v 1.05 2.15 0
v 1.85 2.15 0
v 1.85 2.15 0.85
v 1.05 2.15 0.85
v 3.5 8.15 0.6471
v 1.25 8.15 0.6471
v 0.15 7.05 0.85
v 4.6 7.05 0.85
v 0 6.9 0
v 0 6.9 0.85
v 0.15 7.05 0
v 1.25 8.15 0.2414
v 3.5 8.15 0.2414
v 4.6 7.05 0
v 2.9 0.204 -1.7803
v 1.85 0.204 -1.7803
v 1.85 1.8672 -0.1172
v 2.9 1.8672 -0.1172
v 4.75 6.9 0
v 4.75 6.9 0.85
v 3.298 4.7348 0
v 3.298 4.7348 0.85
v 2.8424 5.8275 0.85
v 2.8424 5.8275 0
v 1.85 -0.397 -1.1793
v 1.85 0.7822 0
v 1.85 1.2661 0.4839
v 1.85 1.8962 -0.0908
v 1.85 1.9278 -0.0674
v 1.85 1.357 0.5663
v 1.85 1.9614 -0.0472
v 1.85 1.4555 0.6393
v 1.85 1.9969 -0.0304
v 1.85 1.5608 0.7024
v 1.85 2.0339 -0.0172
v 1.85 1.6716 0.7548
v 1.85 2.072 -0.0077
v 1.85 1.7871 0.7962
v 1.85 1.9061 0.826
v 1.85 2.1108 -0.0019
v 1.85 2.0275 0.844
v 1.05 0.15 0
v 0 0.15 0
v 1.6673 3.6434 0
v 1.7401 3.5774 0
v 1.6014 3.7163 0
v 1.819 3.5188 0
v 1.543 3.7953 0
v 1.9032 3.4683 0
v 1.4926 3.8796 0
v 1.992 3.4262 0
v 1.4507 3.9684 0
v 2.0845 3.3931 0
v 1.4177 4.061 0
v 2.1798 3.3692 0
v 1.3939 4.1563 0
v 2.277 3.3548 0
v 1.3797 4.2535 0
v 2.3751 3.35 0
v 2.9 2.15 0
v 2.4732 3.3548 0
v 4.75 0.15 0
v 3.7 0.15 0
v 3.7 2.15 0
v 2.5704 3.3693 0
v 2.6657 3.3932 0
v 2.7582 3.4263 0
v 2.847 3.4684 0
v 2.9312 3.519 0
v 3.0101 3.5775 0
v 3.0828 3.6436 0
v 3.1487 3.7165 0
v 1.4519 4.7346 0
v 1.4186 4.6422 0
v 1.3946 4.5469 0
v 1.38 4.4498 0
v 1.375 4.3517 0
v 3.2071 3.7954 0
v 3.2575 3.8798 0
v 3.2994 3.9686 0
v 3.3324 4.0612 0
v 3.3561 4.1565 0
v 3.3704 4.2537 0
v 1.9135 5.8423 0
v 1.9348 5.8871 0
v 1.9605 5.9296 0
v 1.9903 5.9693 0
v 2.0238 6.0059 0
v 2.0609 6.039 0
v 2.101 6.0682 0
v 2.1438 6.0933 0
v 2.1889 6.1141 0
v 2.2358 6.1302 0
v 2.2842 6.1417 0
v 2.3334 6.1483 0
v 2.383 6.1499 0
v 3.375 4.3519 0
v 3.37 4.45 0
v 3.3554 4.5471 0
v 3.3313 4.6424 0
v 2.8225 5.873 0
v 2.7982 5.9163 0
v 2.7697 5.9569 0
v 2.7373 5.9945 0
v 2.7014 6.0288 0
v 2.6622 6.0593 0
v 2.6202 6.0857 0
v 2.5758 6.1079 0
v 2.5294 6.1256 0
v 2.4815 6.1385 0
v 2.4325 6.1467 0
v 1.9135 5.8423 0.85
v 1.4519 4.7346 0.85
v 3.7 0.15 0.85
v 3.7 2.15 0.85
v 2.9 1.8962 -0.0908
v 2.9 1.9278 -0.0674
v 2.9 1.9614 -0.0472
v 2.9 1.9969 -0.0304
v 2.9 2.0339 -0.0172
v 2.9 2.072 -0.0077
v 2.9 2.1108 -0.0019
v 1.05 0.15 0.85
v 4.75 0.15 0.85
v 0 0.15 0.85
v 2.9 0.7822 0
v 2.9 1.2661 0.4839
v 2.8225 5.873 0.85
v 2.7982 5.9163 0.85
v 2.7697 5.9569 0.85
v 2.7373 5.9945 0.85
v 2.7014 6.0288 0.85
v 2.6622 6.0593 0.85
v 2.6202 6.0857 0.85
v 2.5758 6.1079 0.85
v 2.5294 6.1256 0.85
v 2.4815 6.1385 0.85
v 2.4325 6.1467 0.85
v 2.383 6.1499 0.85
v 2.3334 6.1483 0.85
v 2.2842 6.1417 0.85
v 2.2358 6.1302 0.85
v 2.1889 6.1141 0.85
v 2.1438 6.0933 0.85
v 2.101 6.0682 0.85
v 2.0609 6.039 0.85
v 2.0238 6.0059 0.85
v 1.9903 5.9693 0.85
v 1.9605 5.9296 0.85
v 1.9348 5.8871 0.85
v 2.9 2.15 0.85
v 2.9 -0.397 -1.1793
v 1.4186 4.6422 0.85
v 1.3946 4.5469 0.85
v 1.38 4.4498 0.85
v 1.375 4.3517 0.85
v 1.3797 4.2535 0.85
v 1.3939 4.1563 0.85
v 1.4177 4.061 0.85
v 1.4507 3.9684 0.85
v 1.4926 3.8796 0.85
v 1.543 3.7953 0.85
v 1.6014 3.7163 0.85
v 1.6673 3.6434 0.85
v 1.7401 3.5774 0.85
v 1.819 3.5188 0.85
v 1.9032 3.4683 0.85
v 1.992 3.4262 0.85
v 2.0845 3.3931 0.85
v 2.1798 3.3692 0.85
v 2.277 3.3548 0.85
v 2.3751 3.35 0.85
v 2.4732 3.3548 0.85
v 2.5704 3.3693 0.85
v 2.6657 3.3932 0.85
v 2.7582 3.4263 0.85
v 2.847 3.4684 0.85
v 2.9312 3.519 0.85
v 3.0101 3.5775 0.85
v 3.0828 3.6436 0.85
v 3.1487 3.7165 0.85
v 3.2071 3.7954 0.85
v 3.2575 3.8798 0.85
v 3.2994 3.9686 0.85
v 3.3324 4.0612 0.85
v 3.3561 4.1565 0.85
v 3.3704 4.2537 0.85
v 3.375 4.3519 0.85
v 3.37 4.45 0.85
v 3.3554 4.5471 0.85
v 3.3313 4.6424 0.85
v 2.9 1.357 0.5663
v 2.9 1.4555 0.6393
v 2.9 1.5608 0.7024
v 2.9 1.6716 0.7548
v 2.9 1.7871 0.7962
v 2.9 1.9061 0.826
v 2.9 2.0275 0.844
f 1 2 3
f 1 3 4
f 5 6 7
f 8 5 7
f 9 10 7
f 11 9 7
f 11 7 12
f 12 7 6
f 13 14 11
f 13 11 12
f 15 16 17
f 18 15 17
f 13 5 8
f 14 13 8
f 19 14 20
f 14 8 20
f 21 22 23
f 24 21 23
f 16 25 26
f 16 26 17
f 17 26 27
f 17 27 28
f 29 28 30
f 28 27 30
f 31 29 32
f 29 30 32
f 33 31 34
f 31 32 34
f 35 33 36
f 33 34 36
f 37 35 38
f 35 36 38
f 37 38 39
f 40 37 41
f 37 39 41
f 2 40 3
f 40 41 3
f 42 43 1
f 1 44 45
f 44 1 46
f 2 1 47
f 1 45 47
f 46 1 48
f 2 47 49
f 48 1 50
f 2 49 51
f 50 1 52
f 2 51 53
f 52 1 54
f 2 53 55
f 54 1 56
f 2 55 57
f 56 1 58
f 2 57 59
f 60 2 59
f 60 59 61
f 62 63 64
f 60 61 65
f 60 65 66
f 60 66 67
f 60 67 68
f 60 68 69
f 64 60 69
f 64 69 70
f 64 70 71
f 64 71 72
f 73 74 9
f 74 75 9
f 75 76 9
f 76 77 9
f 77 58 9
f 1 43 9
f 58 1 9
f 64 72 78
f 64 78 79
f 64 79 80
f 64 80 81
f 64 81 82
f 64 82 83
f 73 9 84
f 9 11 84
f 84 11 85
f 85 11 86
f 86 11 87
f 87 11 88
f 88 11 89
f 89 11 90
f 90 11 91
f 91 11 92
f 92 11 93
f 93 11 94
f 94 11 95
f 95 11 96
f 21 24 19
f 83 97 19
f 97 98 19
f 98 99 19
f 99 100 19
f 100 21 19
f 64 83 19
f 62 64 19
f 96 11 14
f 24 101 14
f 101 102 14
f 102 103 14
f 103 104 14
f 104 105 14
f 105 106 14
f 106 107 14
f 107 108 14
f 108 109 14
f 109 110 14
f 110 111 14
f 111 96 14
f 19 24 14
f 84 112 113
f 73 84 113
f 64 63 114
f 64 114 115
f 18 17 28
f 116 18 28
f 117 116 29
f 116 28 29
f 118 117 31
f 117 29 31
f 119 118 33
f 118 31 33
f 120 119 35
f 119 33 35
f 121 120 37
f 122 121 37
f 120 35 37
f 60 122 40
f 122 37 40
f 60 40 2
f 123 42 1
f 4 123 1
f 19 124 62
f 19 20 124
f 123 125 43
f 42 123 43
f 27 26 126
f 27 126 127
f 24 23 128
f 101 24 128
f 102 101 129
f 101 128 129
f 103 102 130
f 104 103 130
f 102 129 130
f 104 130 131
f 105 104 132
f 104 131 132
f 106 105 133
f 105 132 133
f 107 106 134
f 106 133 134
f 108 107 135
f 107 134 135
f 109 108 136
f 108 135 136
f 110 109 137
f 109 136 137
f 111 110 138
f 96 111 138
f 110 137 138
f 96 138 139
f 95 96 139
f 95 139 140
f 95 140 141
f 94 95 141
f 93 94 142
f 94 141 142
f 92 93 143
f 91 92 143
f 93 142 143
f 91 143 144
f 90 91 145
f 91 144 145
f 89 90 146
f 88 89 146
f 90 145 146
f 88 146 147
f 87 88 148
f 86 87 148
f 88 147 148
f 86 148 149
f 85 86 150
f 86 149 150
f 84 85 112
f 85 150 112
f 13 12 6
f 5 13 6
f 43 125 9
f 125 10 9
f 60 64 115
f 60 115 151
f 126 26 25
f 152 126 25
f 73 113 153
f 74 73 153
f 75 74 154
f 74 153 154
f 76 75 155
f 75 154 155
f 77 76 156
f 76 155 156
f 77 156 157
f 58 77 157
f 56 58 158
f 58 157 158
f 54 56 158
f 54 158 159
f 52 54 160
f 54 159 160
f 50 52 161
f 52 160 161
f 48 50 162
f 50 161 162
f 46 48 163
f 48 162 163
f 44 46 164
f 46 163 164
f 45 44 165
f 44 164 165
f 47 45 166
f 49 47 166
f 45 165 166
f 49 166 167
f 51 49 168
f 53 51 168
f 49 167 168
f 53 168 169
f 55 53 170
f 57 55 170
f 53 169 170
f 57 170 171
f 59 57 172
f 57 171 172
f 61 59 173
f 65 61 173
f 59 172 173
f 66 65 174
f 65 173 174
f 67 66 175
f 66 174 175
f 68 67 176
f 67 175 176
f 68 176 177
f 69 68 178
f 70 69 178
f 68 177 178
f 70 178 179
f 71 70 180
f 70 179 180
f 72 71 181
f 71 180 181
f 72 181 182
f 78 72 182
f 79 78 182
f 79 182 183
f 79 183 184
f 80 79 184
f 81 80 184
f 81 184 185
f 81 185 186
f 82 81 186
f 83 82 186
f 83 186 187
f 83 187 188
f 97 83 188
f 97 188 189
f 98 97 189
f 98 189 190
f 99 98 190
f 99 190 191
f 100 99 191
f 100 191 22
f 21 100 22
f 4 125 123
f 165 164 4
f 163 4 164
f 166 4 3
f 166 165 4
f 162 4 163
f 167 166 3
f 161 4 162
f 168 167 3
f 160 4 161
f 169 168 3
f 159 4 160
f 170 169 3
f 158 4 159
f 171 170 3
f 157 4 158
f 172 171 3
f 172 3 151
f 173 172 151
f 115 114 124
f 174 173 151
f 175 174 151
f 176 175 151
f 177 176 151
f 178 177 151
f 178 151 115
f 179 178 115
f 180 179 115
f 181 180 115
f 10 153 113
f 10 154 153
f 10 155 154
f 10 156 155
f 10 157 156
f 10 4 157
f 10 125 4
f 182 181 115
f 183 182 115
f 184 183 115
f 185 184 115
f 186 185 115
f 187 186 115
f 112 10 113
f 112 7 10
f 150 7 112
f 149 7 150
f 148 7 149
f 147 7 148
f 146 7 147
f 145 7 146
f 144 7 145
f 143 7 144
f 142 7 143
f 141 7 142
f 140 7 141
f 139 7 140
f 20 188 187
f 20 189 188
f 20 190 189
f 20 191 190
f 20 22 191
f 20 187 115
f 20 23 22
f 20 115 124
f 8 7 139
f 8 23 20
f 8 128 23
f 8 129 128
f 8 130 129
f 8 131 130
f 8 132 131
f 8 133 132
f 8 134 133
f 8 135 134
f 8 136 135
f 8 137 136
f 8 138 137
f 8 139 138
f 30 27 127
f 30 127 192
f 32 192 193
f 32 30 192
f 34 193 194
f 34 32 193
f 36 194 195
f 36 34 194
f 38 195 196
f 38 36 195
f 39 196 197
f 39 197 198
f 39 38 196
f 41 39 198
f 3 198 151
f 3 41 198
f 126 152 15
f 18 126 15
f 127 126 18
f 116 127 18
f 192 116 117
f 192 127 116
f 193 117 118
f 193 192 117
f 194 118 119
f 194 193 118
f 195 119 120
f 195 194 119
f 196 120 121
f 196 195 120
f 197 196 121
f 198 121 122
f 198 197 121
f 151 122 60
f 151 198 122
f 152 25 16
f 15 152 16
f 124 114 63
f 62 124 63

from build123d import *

# Parameters (mm, degrees)
BOSS_EXTRUDE1_DEPTH    = 4.75
CUT_EXTRUDE1_REACH     = 11.471
CUT_EXTRUDE2_DEPTH     = 0.85
SKETCH6_W              = 0.8
SKETCH6_H              = 2
CUT_EXTRUDE3_DEPTH     = 0.85
SKETCH7_W              = 1.05
SKETCH7_H              = 0.85
BOSS_EXTRUDE2_DEPTH    = 1
SKETCHED_START         = 1.85
SKETCHED_BEND1_DEPTH   = 1.05
SKETCHED_BEND1_2_DEPTH = 1.05


# Read off the part's stored shape, not the designer's step: Sketched Bend1
with BuildPart() as part:
    # Sketch1 → Boss-Extrude1 (new body)
    with BuildSketch(Plane(origin=(0, 0, 0), x_dir=(0, 0, -1), z_dir=(1, 0, 0))):
        Polygon((0, 0.15), (0, 7.05), (-0.241393443, 8.15), (-0.647131148, 8.15), (-0.85, 7.05), (-0.85, 0.15), align=None)
    extrude(amount=BOSS_EXTRUDE1_DEPTH)

    # Cut-Extrude1: up to this face of the body (flat: up to its plane)
    cut_extrude1_end = Plane(part.part.faces().sort_by_distance((2.375, 3.6, 0))[0])
    # Sketch4 → Cut-Extrude1 (cut, up to the picked face)
    with BuildSketch(Plane.XY.offset(0.85), mode=Mode.PRIVATE) as cut_extrude1_sk1:
        Polygon((0, 6.9), (1.25, 8.15), (0, 8.15), align=None)
    cut_extrude1_tool1 = split(extrude(cut_extrude1_sk1.sketch, amount=-CUT_EXTRUDE1_REACH, mode=Mode.PRIVATE), bisect_by=cut_extrude1_end, keep=Keep.BOTH, mode=Mode.PRIVATE)
    # Sketch4 → Cut-Extrude1 (cut, up to the picked face)
    with BuildSketch(Plane.XY.offset(0.85), mode=Mode.PRIVATE) as cut_extrude1_sk2:
        Polygon((3.5, 8.15), (4.75, 6.9), (4.75, 8.15), align=None)
    cut_extrude1_tool2 = split(extrude(cut_extrude1_sk2.sketch, amount=-CUT_EXTRUDE1_REACH, mode=Mode.PRIVATE), bisect_by=cut_extrude1_end, keep=Keep.BOTH, mode=Mode.PRIVATE)
    add(cut_extrude1_tool1.solids().sort_by(Axis((0.416667, 7.733333, 0.85), (0, 0, -1)))[0], mode=Mode.SUBTRACT)
    add(cut_extrude1_tool2.solids().sort_by(Axis((4.333333, 7.733333, 0.85), (0, 0, -1)))[0], mode=Mode.SUBTRACT)

    # Sketch5 → Cut-Extrude2 (cut)
    with BuildSketch(Plane.XY.offset(0.85)):
        with BuildLine():
            Line((1.913461538, 5.842307692), (1.451923077, 4.734615385))
            ThreePointArc((1.451923077, 4.734615385), (2.37510742, 3.350000006), (3.297994271, 4.734813689))
            Line((3.297994271, 4.734813689), (2.842436975, 5.827489929))
            ThreePointArc((2.842436975, 5.827489929), (2.382974312, 6.149936406), (1.913461538, 5.842307692))
        make_face()
    extrude(amount=-CUT_EXTRUDE2_DEPTH, mode=Mode.SUBTRACT)

    # Sketch6 → Cut-Extrude3 (cut)
    with BuildSketch(Plane(origin=(0, 0, 0), x_dir=(-1, 0, 0), z_dir=(0, 0, -1))):
        with Locations((-3.3, 1.15)):
            Rectangle(SKETCH6_W, SKETCH6_H)
        with Locations((-1.45, 1.15)):
            Rectangle(SKETCH6_W, SKETCH6_H)
    extrude(amount=-CUT_EXTRUDE3_DEPTH, mode=Mode.SUBTRACT)

    # Sketch7 → Boss-Extrude2 (add)
    with BuildSketch(Plane.XZ.offset(-0.15)):
        with Locations((2.375, 0.425)):
            Rectangle(SKETCH7_W, SKETCH7_H)
    extrude(amount=BOSS_EXTRUDE2_DEPTH)

    # Sketched Bend1 outline → Sketched Bend1 (cut)
    with BuildSketch(Plane.YZ.offset(SKETCHED_START)):
        with BuildLine():
            ThreePointArc((1.266116524, 0.483883476), (1.67164571, 0.754849416), (2.15, 0.85))
            Line((2.15, 0.85), (-0.85, 0.85))
            Line((-0.85, 0.85), (-0.85, 0))
            Line((-0.85, 0), (0.782233048, 0))
            Line((0.782233048, 0), (1.266116524, 0.483883476))
        make_face()
    extrude(amount=SKETCHED_BEND1_DEPTH, mode=Mode.SUBTRACT)

    # Sketched Bend1 2 outline → Sketched Bend1 2 (add)
    with BuildSketch(Plane.YZ.offset(SKETCHED_START)):
        with BuildLine():
            Line((2.15, 0), (0.782233048, 0))
            Line((0.782233048, 0), (-0.397031517, -1.179264564))
            Line((-0.397031517, -1.179264564), (0.204009247, -1.780305328))
            Line((0.204009247, -1.780305328), (1.867157288, -0.117157288))
            ThreePointArc((1.867157288, -0.117157288), (1.996926627, -0.030448187), (2.15, 0))
        make_face()
    extrude(amount=SKETCHED_BEND1_2_DEPTH)


solid = part.part
